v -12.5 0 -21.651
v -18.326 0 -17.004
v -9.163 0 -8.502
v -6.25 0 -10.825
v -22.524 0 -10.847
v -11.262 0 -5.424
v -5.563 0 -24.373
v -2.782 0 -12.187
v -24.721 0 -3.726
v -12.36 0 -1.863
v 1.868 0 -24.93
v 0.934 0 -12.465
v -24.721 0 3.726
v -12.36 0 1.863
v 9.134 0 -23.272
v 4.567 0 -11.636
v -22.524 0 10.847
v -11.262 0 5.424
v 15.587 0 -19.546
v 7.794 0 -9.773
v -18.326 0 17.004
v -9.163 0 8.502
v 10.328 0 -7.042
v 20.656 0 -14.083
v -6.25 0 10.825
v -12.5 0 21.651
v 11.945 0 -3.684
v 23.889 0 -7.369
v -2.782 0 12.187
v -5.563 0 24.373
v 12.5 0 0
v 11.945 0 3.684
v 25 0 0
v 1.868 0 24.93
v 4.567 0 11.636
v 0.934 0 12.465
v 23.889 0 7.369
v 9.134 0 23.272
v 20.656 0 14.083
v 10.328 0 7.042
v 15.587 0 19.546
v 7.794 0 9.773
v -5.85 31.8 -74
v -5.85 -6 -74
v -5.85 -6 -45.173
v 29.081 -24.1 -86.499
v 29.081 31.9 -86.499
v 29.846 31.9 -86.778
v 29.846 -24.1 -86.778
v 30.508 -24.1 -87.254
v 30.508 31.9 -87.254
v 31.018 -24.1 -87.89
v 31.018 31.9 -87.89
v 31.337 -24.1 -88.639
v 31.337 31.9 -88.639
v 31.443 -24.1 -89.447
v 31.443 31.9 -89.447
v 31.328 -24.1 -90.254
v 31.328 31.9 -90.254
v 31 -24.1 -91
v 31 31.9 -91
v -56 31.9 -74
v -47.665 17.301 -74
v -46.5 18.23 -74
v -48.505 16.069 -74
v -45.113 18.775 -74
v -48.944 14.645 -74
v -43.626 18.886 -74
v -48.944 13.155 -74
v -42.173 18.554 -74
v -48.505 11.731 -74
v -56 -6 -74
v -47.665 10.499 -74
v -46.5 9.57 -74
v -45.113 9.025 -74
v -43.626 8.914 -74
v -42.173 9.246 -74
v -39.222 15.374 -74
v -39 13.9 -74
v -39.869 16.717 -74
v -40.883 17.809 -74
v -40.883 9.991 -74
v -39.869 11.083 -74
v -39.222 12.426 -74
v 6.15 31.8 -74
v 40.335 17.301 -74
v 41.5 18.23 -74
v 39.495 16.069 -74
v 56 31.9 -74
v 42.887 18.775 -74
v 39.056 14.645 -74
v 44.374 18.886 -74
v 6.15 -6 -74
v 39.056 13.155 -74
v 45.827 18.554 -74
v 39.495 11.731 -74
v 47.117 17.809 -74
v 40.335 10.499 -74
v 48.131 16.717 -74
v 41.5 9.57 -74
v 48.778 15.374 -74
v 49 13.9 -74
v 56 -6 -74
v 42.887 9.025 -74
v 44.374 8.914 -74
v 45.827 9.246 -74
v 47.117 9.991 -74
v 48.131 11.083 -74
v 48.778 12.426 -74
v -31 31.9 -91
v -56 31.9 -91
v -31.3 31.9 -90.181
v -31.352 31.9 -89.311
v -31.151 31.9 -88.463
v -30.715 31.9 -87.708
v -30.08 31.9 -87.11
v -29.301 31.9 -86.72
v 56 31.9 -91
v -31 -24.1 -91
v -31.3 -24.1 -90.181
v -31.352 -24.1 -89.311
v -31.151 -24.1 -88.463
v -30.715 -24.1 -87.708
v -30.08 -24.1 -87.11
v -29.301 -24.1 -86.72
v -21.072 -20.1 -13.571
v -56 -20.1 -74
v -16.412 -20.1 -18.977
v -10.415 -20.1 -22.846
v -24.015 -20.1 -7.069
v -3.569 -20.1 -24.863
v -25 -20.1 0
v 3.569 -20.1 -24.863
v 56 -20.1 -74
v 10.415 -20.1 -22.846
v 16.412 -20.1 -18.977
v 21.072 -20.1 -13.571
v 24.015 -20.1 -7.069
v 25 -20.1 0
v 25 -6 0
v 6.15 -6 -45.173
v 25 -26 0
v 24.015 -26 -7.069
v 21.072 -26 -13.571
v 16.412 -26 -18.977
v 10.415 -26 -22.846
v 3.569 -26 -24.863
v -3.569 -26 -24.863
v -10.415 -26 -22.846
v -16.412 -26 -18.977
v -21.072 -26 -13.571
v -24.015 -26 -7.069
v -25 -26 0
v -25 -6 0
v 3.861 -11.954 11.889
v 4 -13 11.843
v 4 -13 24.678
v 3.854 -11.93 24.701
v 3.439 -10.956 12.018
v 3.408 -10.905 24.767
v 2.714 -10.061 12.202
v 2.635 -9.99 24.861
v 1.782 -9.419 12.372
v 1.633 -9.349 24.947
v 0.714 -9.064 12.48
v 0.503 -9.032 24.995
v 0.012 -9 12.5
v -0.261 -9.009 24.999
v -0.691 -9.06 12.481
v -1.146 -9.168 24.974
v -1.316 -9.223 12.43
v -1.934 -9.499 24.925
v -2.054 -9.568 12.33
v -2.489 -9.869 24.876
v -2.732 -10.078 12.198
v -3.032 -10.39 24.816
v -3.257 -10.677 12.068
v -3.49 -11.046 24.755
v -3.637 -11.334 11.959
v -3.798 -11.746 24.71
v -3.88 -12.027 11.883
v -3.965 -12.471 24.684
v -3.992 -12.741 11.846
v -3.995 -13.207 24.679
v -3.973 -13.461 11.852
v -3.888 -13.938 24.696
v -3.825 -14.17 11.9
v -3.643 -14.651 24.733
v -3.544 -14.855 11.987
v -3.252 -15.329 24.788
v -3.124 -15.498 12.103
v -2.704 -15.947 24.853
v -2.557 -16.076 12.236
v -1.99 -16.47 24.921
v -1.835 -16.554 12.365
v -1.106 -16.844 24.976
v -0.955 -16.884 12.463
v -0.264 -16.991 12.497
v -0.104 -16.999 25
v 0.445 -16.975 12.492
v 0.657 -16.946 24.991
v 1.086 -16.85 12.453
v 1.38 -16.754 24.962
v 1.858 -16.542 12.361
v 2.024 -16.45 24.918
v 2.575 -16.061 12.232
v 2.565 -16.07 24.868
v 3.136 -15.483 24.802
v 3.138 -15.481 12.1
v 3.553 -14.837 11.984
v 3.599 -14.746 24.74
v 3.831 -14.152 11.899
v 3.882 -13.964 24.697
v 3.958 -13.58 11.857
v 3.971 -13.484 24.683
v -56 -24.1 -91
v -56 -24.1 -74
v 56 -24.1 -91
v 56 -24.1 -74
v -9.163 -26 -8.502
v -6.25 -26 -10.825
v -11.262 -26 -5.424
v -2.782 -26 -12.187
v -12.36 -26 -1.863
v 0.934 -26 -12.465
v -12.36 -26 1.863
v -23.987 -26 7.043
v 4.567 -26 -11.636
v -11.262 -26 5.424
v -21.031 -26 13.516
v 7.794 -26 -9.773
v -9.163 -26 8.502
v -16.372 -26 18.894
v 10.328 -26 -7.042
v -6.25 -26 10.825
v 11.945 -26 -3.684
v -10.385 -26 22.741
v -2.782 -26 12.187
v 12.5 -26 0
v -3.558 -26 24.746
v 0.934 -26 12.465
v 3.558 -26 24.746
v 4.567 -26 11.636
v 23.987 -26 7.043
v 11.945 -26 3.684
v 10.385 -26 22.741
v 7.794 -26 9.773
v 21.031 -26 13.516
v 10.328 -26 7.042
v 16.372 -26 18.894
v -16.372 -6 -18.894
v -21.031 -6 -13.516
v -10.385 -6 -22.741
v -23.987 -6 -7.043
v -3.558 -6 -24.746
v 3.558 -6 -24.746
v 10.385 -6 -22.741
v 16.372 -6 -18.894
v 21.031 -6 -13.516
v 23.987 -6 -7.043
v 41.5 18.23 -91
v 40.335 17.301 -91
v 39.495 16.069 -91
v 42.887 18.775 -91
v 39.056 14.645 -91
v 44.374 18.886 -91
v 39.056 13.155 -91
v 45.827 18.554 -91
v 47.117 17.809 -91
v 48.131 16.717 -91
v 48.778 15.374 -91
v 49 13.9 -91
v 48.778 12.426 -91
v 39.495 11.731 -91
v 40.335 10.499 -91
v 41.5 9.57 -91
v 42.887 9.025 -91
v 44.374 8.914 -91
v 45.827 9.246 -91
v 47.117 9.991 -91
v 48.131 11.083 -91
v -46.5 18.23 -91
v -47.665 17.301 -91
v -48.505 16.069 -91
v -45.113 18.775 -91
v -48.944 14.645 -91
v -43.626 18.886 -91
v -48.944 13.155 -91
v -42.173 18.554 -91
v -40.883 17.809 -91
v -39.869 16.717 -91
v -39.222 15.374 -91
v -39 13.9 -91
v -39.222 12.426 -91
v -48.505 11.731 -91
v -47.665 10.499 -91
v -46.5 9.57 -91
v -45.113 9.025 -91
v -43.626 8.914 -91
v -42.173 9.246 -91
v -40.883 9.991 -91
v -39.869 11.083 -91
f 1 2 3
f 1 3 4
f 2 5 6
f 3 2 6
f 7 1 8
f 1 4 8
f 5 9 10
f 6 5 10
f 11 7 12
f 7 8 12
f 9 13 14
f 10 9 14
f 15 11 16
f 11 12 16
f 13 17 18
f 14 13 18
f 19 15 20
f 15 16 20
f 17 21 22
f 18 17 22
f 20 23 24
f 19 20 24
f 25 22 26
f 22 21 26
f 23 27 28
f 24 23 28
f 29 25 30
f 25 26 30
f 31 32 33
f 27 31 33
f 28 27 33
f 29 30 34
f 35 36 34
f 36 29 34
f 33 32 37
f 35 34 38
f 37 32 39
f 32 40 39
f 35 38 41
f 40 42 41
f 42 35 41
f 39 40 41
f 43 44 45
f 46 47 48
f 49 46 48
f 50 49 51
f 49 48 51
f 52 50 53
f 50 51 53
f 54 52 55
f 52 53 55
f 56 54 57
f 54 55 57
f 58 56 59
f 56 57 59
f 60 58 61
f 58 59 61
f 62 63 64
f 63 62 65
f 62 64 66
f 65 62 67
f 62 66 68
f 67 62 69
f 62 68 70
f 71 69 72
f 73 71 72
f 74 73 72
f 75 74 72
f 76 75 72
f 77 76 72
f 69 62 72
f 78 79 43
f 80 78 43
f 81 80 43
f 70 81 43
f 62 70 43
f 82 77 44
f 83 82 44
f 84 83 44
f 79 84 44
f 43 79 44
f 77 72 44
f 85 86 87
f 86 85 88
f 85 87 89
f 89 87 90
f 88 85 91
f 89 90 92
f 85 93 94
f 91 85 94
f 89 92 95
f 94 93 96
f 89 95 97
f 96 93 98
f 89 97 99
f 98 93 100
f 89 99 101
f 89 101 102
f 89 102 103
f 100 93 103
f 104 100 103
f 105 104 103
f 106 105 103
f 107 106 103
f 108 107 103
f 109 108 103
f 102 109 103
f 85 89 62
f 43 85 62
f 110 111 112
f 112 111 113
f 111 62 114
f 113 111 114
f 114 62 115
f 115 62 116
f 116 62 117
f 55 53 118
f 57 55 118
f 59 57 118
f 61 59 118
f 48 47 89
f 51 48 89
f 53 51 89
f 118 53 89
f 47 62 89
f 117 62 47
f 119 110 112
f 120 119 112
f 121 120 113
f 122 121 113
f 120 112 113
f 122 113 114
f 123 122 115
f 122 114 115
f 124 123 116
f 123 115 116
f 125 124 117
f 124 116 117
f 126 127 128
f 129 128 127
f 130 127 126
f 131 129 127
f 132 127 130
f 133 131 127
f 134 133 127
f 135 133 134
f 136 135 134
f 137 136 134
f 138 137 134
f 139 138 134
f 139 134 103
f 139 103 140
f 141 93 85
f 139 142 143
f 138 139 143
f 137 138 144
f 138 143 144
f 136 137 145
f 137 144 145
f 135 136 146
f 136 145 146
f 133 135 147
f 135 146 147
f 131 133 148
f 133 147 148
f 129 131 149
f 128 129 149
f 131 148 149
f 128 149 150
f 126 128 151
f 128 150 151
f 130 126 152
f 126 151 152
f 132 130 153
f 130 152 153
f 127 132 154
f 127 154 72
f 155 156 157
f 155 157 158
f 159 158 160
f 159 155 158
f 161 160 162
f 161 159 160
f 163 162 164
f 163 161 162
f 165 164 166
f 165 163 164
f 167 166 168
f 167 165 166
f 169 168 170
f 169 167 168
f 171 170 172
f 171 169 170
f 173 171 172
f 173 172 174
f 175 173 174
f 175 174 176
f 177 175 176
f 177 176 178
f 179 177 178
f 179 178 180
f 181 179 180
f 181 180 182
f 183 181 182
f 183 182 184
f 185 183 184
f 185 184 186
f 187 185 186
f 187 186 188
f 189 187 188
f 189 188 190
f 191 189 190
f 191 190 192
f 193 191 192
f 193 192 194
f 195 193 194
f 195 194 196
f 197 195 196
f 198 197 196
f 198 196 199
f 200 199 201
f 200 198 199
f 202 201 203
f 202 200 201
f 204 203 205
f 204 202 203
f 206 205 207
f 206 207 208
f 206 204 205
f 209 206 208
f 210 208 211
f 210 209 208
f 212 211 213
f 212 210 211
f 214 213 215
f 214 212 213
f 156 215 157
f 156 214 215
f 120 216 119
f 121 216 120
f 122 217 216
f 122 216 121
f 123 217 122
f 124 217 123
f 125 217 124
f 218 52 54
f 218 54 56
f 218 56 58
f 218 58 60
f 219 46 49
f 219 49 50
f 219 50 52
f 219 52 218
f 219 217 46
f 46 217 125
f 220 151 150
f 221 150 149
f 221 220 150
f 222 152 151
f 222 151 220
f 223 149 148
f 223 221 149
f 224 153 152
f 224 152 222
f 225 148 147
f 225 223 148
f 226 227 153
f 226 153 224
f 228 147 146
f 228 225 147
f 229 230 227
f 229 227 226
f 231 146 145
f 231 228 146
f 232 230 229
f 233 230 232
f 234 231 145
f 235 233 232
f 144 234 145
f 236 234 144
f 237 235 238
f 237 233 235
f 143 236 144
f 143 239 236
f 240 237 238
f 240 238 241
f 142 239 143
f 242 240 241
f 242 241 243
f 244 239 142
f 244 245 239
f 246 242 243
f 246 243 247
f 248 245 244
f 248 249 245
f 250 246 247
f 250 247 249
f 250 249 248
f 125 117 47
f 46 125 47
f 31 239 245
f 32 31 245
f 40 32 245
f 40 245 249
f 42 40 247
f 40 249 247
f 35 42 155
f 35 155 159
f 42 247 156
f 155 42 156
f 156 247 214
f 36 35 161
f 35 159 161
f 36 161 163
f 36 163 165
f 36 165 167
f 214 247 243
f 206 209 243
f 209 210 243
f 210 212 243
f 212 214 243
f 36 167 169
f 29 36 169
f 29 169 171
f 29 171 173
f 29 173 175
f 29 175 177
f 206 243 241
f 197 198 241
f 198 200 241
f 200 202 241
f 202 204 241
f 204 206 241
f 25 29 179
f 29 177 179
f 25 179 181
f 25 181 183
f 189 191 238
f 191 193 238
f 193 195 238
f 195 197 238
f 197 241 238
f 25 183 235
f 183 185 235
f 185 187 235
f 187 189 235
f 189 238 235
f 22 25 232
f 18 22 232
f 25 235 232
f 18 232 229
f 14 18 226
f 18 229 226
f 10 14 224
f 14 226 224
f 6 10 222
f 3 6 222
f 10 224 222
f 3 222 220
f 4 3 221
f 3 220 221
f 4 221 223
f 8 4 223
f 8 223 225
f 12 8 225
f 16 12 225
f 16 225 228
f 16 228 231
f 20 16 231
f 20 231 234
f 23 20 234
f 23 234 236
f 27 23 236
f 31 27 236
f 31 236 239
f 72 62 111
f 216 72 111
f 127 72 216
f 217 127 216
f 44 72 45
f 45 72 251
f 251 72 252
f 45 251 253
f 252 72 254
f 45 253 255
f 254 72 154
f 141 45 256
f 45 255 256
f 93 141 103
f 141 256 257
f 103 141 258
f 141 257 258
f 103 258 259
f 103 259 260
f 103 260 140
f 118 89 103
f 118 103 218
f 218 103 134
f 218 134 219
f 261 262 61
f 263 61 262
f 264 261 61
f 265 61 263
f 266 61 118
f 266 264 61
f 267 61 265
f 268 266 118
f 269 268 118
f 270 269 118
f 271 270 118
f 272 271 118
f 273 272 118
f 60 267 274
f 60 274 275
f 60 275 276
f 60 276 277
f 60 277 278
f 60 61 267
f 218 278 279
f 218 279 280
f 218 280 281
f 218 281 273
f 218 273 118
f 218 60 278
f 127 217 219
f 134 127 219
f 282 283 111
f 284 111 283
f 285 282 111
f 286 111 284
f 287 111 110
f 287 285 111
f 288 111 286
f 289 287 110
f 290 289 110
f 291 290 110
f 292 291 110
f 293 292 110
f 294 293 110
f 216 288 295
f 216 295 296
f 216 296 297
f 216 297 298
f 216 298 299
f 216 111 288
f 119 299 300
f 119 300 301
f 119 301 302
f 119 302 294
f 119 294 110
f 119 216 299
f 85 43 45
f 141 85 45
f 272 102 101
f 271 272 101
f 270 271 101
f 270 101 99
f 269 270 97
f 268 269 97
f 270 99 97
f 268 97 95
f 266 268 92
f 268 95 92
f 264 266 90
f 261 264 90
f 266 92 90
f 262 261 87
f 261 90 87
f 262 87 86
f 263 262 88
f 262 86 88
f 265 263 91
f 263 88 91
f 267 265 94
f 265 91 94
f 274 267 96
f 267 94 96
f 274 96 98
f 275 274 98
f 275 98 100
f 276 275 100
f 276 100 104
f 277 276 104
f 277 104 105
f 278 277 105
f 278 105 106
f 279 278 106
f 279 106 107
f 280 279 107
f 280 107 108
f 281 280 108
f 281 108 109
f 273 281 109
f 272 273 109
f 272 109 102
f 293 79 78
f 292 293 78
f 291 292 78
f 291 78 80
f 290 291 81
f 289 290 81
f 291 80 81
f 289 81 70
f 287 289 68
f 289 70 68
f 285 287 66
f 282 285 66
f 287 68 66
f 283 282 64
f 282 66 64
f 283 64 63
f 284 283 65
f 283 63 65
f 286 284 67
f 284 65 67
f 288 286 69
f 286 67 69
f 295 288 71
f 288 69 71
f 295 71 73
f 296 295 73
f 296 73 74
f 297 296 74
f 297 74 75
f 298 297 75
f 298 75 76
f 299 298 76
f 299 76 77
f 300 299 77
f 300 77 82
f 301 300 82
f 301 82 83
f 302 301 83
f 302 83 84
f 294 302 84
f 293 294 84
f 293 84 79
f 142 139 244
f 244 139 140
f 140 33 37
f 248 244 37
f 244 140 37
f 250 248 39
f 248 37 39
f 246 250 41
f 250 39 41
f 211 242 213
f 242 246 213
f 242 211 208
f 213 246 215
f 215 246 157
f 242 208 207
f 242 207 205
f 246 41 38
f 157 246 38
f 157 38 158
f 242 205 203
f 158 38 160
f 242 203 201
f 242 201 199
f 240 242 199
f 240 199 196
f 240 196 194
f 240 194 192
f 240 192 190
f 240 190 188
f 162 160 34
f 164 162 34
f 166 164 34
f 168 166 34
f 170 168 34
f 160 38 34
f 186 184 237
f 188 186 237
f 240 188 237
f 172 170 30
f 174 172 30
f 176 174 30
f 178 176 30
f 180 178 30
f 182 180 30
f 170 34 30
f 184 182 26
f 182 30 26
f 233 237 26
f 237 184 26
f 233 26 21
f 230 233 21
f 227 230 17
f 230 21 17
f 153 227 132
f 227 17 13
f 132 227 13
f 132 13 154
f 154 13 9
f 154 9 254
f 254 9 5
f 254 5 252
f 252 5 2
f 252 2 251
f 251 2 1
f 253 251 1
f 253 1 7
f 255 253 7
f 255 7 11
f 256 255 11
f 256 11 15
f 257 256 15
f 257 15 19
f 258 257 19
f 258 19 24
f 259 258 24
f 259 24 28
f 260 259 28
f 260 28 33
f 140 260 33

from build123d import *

# Parameters (mm, degrees)
F0_R      = 25
F1_DEPTH  = 26
F3_DEPTH  = 20
F5_DEPTH  = 5.7
F7_DEPTH  = 5.9
F6_R      = 12.5
F8_DEPTH  = 26.001
F9_W      = 112
F9_H      = 56
F10_DEPTH = 17
F11_W     = 12
F11_H     = 28.827018
F12_DEPTH = 37.8
F14_DEPTH = 61.850929
F15_R     = 5
F16_DEPTH = 17.001
F18_DEPTH = 57.901
F19_R     = 4
F20_DEPTH = 25.001


with BuildPart() as f1:
    # F0 (on Front) → F1 (new body)
    with BuildSketch(Plane.XZ):
        Circle(F0_R)
    extrude(amount=F1_DEPTH)

    # F2 (on face) → F3 (join)
    with BuildSketch(Plane.XZ.offset(26)):
        Polygon((-25, 0), (-56, -74), (56, -74), (25, 0), align=None)
    extrude(amount=-F3_DEPTH)

    # F4 (on face) → F5 (cut)
    with BuildSketch(Plane.XZ.offset(26)):
        with BuildLine():
            ThreePointArc((25, 0), (0, -25.118919), (-25, 0))
            Line((-25, 0), (-56, -74))
            Line((-56, -74), (56, -74))
            Line((56, -74), (25, 0))
        make_face()
    extrude(amount=-F5_DEPTH, mode=Mode.SUBTRACT)

    # F4 (on face) → F7 (cut)
    with BuildSketch(Plane.XZ.offset(26)):
        with BuildLine():
            ThreePointArc((25, 0), (0, -25.118919), (-25, 0))
            Line((-25, 0), (-56, -74))
            Line((-56, -74), (56, -74))
            Line((56, -74), (25, 0))
        make_face()
    extrude(amount=-F7_DEPTH, mode=Mode.SUBTRACT)

    # F6 (on face) → F8 (cut, through all)
    with BuildSketch(Plane.XZ.offset(26)):
        Circle(F6_R)
    extrude(amount=-F8_DEPTH, mode=Mode.SUBTRACT)

    # F9 (on face) → F10 (join)
    with BuildSketch(Plane(origin=(0, 0, -74), x_dir=(1, 0, 0), z_dir=(0, 0, -1))):
        with Locations((0, -3.9)):
            Rectangle(F9_W, F9_H)
    extrude(amount=F10_DEPTH)

    # F11 (on face) → F12 (join)
    with BuildSketch(Plane(origin=(0, -6, 0), x_dir=(-1, 0, 0), z_dir=(0, 1, 0))):
        with Locations((-0.150071, -59.586491)):
            Rectangle(F11_W, F11_H)
    extrude(amount=F12_DEPTH)

    # F13 (on face) → F14 (cut, through all)
    with BuildSketch(Plane(origin=(-5.849929, 0, 0), x_dir=(0, -1, 0), z_dir=(-1, 0, 0))):
        Polygon((-31.8, -74), (6, -45.172982), (-31.8, -45.172982), align=None)
    extrude(amount=-F14_DEPTH, mode=Mode.SUBTRACT)

    # F15 (on face) → F16 (cut, through all)
    with BuildSketch(Plane.XY.offset(-74)):
        with Locations((-44, 13.9)):
            Circle(F15_R)
        with Locations((44, 13.9)):
            Circle(F15_R)
    extrude(amount=-F16_DEPTH, mode=Mode.SUBTRACT)

    # F17 (on face) → F18 (cut, through all)
    with BuildSketch(Plane(origin=(0, 31.9, 0), x_dir=(-1, 0, 0), z_dir=(0, 1, 0))):
        with BuildLine():
            Line((-31, -91), (31, -91))
            ThreePointArc((31, -91), (31.151032, -88.462802), (29.300669, -86.720292))
            Line((29.300669, -86.720292), (-29.08097, -86.498646))
            ThreePointArc((-29.08097, -86.498646), (-31.203205, -88.253629), (-31, -91))
        make_face()
    extrude(amount=-F18_DEPTH, mode=Mode.SUBTRACT)

    # F19 (on Top) → F20 (cut, through all)
    with BuildSketch(Plane.XY):
        with Locations((0, -13)):
            Circle(F19_R)
    extrude(amount=F20_DEPTH, mode=Mode.SUBTRACT)


solid = f1.part
